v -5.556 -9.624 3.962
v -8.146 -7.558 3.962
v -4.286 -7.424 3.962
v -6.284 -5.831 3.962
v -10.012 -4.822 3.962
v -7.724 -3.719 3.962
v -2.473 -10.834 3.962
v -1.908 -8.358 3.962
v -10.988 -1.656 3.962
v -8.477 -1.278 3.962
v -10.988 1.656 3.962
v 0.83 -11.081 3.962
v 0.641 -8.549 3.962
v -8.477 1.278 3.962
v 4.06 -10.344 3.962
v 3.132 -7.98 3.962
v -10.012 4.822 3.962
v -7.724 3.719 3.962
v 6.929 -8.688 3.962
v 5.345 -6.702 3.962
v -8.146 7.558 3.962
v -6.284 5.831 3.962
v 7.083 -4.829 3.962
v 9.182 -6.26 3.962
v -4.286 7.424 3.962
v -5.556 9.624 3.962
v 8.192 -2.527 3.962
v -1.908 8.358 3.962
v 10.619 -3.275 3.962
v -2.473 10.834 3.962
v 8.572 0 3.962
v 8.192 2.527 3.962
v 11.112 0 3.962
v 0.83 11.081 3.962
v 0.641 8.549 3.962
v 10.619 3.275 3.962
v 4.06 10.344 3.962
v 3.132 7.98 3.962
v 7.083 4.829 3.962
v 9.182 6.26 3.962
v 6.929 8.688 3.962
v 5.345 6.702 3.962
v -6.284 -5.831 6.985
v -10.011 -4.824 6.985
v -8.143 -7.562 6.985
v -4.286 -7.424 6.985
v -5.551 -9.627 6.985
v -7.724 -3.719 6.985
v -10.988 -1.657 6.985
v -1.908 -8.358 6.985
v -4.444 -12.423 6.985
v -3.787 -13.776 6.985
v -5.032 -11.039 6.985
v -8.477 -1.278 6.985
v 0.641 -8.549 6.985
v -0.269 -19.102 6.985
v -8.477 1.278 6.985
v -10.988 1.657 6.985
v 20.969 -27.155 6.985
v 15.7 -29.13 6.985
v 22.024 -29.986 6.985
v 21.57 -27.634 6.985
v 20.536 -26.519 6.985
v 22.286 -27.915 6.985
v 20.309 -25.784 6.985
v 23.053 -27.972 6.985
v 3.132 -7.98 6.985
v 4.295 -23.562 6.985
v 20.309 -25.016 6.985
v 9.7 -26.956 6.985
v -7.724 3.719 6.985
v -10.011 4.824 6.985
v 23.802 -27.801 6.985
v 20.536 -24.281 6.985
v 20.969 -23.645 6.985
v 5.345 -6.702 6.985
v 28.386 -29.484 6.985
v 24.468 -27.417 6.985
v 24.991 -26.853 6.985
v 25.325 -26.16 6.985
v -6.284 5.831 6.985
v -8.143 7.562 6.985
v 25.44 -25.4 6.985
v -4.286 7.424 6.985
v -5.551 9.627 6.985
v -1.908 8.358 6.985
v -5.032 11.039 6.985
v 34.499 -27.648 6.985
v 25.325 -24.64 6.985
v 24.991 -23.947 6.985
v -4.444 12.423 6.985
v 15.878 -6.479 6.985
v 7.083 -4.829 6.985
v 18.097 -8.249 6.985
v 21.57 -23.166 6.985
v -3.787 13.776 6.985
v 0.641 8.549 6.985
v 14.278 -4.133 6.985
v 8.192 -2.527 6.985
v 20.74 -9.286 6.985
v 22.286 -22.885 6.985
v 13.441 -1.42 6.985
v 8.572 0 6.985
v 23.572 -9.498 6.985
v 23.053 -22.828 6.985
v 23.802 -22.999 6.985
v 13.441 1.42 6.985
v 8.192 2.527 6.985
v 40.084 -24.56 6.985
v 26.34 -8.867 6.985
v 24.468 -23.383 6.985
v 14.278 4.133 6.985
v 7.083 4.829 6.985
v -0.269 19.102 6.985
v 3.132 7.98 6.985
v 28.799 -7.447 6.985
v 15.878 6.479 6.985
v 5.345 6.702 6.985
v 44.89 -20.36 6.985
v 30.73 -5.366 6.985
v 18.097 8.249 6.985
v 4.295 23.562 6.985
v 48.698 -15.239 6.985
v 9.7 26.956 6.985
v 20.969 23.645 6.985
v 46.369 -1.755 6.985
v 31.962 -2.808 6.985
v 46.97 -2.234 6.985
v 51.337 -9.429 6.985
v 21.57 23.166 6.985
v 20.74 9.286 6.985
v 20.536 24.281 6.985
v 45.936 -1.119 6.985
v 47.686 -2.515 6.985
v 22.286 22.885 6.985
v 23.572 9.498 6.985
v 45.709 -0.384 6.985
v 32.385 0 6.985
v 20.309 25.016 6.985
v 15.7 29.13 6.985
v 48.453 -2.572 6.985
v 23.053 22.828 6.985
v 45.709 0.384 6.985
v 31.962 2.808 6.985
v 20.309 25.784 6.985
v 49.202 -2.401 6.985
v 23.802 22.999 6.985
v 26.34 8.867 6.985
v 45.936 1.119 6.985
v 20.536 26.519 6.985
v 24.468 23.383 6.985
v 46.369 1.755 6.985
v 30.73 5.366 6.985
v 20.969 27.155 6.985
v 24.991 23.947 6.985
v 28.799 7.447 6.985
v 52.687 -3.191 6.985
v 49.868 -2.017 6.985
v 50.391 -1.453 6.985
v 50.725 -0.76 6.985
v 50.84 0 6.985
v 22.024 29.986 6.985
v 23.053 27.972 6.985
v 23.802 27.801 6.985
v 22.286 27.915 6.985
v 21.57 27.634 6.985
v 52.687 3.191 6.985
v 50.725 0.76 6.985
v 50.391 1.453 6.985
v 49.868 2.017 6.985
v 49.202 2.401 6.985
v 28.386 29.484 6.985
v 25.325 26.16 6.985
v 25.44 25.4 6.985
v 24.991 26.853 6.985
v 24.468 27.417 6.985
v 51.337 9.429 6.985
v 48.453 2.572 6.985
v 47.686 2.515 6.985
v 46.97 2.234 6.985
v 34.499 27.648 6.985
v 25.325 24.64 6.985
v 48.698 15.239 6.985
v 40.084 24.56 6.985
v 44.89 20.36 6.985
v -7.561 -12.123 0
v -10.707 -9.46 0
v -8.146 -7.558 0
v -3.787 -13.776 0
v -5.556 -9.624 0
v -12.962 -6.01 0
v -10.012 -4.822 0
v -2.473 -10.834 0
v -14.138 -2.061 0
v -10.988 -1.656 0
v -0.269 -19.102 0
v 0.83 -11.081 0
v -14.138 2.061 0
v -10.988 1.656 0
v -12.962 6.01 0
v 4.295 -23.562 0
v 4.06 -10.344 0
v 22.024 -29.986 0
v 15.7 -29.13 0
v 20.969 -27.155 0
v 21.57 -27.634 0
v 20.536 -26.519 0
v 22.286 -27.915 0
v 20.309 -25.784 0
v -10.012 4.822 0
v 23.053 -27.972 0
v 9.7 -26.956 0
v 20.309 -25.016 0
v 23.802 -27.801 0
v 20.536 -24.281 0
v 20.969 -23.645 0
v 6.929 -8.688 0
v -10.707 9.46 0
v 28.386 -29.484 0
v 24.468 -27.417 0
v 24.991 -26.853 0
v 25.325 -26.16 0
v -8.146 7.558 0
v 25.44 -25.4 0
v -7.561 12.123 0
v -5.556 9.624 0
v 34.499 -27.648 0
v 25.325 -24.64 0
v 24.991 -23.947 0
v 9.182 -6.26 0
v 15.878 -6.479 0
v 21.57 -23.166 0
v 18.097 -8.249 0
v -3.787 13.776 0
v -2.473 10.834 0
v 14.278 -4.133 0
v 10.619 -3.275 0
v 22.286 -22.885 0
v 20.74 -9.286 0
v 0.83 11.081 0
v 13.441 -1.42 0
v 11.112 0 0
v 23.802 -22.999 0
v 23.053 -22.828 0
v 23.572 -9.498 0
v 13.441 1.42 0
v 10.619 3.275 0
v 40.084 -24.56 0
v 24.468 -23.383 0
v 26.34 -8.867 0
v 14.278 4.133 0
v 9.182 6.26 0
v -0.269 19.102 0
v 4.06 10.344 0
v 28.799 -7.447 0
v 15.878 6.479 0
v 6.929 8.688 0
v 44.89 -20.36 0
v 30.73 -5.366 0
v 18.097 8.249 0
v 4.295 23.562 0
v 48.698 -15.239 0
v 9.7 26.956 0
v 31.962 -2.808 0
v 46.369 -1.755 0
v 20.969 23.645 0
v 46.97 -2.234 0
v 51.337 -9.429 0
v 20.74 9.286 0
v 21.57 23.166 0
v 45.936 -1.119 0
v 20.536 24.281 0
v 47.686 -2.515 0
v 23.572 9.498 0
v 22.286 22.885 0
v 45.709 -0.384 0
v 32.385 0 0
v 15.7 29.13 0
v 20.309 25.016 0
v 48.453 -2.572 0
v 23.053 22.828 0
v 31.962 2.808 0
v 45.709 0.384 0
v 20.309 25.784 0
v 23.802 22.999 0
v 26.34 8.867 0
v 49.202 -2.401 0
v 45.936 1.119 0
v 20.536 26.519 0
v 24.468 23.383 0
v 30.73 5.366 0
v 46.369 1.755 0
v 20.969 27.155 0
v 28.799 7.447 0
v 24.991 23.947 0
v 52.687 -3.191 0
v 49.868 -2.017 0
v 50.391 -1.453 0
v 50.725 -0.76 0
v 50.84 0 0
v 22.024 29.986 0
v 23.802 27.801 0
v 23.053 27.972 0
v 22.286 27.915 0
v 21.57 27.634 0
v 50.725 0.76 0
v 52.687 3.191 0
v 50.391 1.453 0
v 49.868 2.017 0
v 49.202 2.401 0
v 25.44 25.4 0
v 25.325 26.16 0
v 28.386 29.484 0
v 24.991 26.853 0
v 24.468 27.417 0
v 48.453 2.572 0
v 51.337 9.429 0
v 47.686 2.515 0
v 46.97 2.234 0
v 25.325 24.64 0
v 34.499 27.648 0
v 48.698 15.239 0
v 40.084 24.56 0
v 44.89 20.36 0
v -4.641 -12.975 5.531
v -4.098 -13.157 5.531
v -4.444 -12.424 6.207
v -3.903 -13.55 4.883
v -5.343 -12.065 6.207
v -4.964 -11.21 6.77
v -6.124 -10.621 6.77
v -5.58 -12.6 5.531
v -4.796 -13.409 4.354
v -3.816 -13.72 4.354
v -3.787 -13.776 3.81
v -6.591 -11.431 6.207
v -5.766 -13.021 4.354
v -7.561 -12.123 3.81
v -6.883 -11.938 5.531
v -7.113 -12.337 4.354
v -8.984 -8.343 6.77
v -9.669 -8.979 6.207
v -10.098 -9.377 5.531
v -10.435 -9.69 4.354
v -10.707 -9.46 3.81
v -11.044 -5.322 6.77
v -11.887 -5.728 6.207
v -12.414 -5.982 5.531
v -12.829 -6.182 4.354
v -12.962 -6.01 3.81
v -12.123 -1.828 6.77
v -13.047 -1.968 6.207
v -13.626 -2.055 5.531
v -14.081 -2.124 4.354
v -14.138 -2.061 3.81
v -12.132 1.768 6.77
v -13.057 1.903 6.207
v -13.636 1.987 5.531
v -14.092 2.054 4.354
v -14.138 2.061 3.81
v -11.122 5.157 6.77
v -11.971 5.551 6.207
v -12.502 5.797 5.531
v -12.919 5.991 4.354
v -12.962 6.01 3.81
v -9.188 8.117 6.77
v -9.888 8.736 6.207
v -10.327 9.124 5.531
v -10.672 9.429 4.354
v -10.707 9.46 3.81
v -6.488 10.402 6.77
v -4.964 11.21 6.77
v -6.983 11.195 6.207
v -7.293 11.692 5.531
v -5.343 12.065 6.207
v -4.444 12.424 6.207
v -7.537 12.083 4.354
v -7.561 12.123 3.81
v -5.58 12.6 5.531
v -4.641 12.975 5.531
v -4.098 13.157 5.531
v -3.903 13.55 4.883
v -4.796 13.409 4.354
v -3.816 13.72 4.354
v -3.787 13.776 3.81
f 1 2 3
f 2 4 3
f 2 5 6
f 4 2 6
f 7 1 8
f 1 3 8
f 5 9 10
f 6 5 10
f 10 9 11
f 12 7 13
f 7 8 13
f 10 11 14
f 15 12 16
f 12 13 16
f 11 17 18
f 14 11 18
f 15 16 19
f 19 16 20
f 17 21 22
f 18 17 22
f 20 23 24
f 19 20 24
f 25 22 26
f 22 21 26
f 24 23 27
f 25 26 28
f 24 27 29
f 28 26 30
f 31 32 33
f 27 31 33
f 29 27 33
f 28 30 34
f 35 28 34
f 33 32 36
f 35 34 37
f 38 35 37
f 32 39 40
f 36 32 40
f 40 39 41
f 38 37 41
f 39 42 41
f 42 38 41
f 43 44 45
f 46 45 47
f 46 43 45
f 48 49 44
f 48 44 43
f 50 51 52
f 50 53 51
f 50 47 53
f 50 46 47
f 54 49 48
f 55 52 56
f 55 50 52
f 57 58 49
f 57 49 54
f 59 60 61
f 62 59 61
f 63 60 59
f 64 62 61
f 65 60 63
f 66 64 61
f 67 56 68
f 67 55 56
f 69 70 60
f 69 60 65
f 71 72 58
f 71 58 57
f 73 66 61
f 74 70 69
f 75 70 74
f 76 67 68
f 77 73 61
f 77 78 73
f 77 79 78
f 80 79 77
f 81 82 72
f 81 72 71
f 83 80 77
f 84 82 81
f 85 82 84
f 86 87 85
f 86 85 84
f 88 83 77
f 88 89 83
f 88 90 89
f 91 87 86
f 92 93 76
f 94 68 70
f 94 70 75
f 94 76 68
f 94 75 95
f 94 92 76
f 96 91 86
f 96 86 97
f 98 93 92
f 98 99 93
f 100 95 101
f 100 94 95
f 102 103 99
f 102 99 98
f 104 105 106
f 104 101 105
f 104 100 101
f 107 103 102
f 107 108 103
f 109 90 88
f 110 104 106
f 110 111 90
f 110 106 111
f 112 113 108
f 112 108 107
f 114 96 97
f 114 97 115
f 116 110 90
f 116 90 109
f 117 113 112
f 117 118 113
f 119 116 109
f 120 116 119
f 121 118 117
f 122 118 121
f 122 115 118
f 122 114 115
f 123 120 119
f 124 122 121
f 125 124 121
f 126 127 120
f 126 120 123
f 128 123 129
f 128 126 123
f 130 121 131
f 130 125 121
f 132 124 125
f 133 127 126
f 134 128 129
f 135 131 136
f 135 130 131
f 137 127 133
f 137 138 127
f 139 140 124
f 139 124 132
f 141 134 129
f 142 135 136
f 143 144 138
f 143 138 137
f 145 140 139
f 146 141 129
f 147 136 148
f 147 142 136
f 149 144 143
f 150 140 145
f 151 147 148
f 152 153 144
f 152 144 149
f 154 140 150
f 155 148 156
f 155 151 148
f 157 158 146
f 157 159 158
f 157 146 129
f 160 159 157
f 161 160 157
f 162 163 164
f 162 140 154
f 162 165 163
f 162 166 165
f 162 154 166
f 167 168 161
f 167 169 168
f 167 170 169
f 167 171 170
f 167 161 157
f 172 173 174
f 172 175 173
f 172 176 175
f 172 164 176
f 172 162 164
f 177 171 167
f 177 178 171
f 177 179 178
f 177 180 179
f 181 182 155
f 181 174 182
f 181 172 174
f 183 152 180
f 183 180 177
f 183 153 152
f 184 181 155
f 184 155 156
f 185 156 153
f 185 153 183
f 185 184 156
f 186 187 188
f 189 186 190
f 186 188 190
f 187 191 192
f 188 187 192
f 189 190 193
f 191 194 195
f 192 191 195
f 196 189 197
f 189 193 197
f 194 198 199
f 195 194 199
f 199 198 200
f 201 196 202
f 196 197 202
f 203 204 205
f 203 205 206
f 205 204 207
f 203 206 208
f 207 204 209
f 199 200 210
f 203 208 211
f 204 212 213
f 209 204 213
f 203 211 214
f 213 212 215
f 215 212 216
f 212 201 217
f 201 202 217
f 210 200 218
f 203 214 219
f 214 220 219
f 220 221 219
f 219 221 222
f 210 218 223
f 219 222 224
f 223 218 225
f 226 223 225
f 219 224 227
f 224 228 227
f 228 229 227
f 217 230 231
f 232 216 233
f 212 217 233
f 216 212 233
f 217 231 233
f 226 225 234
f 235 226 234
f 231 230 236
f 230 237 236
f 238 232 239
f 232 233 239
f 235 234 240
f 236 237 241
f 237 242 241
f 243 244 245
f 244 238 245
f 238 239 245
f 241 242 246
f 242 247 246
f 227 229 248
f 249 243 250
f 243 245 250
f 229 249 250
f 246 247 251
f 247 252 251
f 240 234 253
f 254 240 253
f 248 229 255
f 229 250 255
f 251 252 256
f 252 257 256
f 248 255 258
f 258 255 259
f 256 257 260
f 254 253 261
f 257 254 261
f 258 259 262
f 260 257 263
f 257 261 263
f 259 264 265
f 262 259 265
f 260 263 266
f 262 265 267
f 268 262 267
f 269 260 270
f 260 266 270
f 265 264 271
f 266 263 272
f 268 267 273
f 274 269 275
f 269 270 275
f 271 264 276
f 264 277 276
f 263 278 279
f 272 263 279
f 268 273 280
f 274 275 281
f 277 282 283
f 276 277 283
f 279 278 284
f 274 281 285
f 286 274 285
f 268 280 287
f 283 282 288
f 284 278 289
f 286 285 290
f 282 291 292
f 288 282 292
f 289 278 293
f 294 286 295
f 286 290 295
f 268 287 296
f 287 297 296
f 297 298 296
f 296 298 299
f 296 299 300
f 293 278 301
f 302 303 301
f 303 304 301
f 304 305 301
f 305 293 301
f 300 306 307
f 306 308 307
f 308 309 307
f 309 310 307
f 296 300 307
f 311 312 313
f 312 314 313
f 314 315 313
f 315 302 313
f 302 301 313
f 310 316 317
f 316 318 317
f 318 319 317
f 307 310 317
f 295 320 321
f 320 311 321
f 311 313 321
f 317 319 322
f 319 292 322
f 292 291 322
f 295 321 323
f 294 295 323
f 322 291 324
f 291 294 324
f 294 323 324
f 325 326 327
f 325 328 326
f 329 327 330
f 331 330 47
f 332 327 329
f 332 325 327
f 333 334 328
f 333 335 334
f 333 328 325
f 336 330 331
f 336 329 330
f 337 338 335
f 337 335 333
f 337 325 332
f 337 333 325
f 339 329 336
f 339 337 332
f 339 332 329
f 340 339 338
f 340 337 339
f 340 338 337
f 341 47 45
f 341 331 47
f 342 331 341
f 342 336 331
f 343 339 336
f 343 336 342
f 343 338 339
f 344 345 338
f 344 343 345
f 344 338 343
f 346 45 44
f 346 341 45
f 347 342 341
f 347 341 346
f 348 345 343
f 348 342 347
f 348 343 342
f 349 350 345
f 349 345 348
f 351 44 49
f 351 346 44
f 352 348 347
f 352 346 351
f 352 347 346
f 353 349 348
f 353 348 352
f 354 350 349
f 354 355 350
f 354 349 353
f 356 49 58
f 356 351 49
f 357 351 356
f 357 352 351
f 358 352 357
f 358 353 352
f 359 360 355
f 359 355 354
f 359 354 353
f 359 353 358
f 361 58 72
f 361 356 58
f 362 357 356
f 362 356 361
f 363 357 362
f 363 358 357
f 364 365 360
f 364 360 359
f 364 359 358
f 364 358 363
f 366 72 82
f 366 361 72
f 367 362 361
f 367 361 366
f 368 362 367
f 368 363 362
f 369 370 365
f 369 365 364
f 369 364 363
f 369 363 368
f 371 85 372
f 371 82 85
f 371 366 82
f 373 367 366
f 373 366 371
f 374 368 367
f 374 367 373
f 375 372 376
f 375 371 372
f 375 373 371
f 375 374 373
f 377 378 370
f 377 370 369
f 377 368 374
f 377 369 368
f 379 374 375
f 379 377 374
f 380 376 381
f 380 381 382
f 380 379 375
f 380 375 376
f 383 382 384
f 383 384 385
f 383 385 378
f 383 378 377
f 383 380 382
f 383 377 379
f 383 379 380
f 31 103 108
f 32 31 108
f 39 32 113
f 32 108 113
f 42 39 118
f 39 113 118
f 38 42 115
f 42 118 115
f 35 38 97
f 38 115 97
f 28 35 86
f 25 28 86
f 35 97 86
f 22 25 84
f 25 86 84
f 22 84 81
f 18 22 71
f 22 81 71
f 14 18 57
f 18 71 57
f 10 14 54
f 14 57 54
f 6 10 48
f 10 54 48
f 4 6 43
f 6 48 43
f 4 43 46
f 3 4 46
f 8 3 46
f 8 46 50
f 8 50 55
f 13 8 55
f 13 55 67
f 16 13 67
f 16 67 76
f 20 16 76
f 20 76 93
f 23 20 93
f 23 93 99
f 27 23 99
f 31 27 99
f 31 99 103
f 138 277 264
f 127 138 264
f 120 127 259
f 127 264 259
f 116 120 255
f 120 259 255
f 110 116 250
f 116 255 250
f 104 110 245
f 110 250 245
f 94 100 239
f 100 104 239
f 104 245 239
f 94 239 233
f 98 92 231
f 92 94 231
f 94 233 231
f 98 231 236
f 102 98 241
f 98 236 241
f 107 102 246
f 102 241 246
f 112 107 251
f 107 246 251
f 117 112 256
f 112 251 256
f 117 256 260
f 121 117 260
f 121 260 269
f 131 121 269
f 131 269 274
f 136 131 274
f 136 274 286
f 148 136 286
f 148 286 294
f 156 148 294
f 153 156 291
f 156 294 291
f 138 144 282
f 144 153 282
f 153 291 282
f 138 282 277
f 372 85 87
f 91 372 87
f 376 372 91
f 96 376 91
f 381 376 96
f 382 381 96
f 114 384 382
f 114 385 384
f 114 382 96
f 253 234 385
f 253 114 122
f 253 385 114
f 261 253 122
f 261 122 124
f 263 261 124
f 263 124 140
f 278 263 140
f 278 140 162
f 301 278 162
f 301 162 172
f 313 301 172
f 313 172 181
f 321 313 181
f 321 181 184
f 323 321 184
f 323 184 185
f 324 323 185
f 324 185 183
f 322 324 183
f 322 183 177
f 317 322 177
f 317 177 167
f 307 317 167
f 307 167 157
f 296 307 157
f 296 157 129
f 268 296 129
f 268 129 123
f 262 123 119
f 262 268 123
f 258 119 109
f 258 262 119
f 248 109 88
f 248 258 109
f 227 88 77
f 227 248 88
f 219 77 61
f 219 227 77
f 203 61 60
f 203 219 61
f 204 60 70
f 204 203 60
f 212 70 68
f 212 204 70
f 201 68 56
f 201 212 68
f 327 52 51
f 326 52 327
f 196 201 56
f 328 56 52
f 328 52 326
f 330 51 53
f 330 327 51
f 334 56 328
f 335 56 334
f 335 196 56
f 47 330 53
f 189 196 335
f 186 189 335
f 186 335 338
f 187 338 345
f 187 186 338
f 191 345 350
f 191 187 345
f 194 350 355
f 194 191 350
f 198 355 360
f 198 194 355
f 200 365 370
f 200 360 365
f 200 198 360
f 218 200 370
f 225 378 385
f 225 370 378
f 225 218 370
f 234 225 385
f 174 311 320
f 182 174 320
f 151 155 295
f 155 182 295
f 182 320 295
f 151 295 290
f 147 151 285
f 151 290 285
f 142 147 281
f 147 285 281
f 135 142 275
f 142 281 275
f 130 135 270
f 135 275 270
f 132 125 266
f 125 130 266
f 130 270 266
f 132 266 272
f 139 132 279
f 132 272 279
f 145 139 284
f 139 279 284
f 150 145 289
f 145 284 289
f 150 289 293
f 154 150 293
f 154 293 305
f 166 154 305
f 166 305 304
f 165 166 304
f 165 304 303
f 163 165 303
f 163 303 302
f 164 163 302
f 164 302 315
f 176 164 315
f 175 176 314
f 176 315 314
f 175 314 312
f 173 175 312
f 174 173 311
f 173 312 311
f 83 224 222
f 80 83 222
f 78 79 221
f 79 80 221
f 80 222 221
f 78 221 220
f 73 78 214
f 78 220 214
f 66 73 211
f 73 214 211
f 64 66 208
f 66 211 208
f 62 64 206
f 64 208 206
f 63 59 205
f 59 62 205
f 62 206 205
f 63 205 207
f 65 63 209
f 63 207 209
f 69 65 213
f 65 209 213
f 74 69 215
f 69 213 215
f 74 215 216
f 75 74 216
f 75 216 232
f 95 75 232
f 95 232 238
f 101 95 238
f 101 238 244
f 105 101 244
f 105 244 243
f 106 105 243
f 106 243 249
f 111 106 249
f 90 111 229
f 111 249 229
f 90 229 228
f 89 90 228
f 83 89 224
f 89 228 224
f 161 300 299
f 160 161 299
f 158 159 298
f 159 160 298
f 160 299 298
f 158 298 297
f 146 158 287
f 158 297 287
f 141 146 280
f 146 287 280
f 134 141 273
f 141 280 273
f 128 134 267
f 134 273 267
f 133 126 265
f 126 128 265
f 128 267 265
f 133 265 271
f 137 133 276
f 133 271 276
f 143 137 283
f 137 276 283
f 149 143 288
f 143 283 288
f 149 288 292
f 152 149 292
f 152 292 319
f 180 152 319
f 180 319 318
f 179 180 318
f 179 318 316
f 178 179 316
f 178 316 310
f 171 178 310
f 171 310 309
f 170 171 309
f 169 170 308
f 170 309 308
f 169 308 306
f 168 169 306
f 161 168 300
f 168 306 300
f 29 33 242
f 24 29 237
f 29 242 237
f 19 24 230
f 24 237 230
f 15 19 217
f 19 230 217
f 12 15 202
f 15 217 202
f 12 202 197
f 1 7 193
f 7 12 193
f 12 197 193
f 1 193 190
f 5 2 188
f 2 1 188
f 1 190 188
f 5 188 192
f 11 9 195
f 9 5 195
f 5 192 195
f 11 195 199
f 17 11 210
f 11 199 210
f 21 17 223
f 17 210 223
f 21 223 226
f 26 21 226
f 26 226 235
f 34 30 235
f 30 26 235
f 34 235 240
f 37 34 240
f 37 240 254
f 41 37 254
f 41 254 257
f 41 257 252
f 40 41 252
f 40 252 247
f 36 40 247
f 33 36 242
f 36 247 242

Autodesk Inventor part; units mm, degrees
ref_plane "YZ Plane" through (0, 0, 0) normal (1, 0, 0) x (0, 1, 0)
ref_plane "XZ Plane" through (0, 0, 0) normal (0, 1, 0) x (-1, 0, 0)
ref_plane "XY Plane" through (0, 0, 0) normal (0, 0, 1) x (1, 0, 0)
sketch "Sketch1" plane through (0, 0, 0) normal (0, 0, 1) x (1, 0, 0)
  circle A0 centre (0, 0) radius 11.1125
  circle A1 centre (22.86, 0) radius 9.525
  arc A2 (-3.7868, 13.7765) -> (-3.7868, -13.7765) centre (0, 0) ccw
  circle A3 centre (22.86, -25.4) radius 2.5797
  circle A4 centre (22.86, 0) radius 25.4 construction
  circle A5 centre (48.26, 0) radius 2.5797
  circle A6 centre (22.86, 25.4) radius 2.5797
  circle A7 centre (22.86, 0) radius 29.9974
  dimension "d0" = 22.225
  dimension "d1" = 19.05
  dimension "d2" = 22.86
  dimension "d3" = 3.175
  dimension "d8" = 50.8
  dimension "d11" = 5.1594
  dimension "d17" = 59.9948
extrude "Extrusion1" add sketch "Sketch1" along normal blind 6.985 contours A0 A7 | A0 A7 A2 picked at (30.9689, 18.7513)
sketch "Sketch2" plane through (0, 0, 6.985) normal (0, 0, 1) x (1, 0, 0)
  circle A0 centre (0, 0) radius 11.1125 projected
  circle A1 centre (0, 0) radius 8.5725
  dimension "d14" = 2.54
extrude "Extrusion2" add sketch "Sketch2" against normal blind 3.0226
fillet "Fillet1" radius 3.175 1 edges at (-14.2875, 0, 6.985)
properties part number "MotorBracket" material "ABS Plastic"
